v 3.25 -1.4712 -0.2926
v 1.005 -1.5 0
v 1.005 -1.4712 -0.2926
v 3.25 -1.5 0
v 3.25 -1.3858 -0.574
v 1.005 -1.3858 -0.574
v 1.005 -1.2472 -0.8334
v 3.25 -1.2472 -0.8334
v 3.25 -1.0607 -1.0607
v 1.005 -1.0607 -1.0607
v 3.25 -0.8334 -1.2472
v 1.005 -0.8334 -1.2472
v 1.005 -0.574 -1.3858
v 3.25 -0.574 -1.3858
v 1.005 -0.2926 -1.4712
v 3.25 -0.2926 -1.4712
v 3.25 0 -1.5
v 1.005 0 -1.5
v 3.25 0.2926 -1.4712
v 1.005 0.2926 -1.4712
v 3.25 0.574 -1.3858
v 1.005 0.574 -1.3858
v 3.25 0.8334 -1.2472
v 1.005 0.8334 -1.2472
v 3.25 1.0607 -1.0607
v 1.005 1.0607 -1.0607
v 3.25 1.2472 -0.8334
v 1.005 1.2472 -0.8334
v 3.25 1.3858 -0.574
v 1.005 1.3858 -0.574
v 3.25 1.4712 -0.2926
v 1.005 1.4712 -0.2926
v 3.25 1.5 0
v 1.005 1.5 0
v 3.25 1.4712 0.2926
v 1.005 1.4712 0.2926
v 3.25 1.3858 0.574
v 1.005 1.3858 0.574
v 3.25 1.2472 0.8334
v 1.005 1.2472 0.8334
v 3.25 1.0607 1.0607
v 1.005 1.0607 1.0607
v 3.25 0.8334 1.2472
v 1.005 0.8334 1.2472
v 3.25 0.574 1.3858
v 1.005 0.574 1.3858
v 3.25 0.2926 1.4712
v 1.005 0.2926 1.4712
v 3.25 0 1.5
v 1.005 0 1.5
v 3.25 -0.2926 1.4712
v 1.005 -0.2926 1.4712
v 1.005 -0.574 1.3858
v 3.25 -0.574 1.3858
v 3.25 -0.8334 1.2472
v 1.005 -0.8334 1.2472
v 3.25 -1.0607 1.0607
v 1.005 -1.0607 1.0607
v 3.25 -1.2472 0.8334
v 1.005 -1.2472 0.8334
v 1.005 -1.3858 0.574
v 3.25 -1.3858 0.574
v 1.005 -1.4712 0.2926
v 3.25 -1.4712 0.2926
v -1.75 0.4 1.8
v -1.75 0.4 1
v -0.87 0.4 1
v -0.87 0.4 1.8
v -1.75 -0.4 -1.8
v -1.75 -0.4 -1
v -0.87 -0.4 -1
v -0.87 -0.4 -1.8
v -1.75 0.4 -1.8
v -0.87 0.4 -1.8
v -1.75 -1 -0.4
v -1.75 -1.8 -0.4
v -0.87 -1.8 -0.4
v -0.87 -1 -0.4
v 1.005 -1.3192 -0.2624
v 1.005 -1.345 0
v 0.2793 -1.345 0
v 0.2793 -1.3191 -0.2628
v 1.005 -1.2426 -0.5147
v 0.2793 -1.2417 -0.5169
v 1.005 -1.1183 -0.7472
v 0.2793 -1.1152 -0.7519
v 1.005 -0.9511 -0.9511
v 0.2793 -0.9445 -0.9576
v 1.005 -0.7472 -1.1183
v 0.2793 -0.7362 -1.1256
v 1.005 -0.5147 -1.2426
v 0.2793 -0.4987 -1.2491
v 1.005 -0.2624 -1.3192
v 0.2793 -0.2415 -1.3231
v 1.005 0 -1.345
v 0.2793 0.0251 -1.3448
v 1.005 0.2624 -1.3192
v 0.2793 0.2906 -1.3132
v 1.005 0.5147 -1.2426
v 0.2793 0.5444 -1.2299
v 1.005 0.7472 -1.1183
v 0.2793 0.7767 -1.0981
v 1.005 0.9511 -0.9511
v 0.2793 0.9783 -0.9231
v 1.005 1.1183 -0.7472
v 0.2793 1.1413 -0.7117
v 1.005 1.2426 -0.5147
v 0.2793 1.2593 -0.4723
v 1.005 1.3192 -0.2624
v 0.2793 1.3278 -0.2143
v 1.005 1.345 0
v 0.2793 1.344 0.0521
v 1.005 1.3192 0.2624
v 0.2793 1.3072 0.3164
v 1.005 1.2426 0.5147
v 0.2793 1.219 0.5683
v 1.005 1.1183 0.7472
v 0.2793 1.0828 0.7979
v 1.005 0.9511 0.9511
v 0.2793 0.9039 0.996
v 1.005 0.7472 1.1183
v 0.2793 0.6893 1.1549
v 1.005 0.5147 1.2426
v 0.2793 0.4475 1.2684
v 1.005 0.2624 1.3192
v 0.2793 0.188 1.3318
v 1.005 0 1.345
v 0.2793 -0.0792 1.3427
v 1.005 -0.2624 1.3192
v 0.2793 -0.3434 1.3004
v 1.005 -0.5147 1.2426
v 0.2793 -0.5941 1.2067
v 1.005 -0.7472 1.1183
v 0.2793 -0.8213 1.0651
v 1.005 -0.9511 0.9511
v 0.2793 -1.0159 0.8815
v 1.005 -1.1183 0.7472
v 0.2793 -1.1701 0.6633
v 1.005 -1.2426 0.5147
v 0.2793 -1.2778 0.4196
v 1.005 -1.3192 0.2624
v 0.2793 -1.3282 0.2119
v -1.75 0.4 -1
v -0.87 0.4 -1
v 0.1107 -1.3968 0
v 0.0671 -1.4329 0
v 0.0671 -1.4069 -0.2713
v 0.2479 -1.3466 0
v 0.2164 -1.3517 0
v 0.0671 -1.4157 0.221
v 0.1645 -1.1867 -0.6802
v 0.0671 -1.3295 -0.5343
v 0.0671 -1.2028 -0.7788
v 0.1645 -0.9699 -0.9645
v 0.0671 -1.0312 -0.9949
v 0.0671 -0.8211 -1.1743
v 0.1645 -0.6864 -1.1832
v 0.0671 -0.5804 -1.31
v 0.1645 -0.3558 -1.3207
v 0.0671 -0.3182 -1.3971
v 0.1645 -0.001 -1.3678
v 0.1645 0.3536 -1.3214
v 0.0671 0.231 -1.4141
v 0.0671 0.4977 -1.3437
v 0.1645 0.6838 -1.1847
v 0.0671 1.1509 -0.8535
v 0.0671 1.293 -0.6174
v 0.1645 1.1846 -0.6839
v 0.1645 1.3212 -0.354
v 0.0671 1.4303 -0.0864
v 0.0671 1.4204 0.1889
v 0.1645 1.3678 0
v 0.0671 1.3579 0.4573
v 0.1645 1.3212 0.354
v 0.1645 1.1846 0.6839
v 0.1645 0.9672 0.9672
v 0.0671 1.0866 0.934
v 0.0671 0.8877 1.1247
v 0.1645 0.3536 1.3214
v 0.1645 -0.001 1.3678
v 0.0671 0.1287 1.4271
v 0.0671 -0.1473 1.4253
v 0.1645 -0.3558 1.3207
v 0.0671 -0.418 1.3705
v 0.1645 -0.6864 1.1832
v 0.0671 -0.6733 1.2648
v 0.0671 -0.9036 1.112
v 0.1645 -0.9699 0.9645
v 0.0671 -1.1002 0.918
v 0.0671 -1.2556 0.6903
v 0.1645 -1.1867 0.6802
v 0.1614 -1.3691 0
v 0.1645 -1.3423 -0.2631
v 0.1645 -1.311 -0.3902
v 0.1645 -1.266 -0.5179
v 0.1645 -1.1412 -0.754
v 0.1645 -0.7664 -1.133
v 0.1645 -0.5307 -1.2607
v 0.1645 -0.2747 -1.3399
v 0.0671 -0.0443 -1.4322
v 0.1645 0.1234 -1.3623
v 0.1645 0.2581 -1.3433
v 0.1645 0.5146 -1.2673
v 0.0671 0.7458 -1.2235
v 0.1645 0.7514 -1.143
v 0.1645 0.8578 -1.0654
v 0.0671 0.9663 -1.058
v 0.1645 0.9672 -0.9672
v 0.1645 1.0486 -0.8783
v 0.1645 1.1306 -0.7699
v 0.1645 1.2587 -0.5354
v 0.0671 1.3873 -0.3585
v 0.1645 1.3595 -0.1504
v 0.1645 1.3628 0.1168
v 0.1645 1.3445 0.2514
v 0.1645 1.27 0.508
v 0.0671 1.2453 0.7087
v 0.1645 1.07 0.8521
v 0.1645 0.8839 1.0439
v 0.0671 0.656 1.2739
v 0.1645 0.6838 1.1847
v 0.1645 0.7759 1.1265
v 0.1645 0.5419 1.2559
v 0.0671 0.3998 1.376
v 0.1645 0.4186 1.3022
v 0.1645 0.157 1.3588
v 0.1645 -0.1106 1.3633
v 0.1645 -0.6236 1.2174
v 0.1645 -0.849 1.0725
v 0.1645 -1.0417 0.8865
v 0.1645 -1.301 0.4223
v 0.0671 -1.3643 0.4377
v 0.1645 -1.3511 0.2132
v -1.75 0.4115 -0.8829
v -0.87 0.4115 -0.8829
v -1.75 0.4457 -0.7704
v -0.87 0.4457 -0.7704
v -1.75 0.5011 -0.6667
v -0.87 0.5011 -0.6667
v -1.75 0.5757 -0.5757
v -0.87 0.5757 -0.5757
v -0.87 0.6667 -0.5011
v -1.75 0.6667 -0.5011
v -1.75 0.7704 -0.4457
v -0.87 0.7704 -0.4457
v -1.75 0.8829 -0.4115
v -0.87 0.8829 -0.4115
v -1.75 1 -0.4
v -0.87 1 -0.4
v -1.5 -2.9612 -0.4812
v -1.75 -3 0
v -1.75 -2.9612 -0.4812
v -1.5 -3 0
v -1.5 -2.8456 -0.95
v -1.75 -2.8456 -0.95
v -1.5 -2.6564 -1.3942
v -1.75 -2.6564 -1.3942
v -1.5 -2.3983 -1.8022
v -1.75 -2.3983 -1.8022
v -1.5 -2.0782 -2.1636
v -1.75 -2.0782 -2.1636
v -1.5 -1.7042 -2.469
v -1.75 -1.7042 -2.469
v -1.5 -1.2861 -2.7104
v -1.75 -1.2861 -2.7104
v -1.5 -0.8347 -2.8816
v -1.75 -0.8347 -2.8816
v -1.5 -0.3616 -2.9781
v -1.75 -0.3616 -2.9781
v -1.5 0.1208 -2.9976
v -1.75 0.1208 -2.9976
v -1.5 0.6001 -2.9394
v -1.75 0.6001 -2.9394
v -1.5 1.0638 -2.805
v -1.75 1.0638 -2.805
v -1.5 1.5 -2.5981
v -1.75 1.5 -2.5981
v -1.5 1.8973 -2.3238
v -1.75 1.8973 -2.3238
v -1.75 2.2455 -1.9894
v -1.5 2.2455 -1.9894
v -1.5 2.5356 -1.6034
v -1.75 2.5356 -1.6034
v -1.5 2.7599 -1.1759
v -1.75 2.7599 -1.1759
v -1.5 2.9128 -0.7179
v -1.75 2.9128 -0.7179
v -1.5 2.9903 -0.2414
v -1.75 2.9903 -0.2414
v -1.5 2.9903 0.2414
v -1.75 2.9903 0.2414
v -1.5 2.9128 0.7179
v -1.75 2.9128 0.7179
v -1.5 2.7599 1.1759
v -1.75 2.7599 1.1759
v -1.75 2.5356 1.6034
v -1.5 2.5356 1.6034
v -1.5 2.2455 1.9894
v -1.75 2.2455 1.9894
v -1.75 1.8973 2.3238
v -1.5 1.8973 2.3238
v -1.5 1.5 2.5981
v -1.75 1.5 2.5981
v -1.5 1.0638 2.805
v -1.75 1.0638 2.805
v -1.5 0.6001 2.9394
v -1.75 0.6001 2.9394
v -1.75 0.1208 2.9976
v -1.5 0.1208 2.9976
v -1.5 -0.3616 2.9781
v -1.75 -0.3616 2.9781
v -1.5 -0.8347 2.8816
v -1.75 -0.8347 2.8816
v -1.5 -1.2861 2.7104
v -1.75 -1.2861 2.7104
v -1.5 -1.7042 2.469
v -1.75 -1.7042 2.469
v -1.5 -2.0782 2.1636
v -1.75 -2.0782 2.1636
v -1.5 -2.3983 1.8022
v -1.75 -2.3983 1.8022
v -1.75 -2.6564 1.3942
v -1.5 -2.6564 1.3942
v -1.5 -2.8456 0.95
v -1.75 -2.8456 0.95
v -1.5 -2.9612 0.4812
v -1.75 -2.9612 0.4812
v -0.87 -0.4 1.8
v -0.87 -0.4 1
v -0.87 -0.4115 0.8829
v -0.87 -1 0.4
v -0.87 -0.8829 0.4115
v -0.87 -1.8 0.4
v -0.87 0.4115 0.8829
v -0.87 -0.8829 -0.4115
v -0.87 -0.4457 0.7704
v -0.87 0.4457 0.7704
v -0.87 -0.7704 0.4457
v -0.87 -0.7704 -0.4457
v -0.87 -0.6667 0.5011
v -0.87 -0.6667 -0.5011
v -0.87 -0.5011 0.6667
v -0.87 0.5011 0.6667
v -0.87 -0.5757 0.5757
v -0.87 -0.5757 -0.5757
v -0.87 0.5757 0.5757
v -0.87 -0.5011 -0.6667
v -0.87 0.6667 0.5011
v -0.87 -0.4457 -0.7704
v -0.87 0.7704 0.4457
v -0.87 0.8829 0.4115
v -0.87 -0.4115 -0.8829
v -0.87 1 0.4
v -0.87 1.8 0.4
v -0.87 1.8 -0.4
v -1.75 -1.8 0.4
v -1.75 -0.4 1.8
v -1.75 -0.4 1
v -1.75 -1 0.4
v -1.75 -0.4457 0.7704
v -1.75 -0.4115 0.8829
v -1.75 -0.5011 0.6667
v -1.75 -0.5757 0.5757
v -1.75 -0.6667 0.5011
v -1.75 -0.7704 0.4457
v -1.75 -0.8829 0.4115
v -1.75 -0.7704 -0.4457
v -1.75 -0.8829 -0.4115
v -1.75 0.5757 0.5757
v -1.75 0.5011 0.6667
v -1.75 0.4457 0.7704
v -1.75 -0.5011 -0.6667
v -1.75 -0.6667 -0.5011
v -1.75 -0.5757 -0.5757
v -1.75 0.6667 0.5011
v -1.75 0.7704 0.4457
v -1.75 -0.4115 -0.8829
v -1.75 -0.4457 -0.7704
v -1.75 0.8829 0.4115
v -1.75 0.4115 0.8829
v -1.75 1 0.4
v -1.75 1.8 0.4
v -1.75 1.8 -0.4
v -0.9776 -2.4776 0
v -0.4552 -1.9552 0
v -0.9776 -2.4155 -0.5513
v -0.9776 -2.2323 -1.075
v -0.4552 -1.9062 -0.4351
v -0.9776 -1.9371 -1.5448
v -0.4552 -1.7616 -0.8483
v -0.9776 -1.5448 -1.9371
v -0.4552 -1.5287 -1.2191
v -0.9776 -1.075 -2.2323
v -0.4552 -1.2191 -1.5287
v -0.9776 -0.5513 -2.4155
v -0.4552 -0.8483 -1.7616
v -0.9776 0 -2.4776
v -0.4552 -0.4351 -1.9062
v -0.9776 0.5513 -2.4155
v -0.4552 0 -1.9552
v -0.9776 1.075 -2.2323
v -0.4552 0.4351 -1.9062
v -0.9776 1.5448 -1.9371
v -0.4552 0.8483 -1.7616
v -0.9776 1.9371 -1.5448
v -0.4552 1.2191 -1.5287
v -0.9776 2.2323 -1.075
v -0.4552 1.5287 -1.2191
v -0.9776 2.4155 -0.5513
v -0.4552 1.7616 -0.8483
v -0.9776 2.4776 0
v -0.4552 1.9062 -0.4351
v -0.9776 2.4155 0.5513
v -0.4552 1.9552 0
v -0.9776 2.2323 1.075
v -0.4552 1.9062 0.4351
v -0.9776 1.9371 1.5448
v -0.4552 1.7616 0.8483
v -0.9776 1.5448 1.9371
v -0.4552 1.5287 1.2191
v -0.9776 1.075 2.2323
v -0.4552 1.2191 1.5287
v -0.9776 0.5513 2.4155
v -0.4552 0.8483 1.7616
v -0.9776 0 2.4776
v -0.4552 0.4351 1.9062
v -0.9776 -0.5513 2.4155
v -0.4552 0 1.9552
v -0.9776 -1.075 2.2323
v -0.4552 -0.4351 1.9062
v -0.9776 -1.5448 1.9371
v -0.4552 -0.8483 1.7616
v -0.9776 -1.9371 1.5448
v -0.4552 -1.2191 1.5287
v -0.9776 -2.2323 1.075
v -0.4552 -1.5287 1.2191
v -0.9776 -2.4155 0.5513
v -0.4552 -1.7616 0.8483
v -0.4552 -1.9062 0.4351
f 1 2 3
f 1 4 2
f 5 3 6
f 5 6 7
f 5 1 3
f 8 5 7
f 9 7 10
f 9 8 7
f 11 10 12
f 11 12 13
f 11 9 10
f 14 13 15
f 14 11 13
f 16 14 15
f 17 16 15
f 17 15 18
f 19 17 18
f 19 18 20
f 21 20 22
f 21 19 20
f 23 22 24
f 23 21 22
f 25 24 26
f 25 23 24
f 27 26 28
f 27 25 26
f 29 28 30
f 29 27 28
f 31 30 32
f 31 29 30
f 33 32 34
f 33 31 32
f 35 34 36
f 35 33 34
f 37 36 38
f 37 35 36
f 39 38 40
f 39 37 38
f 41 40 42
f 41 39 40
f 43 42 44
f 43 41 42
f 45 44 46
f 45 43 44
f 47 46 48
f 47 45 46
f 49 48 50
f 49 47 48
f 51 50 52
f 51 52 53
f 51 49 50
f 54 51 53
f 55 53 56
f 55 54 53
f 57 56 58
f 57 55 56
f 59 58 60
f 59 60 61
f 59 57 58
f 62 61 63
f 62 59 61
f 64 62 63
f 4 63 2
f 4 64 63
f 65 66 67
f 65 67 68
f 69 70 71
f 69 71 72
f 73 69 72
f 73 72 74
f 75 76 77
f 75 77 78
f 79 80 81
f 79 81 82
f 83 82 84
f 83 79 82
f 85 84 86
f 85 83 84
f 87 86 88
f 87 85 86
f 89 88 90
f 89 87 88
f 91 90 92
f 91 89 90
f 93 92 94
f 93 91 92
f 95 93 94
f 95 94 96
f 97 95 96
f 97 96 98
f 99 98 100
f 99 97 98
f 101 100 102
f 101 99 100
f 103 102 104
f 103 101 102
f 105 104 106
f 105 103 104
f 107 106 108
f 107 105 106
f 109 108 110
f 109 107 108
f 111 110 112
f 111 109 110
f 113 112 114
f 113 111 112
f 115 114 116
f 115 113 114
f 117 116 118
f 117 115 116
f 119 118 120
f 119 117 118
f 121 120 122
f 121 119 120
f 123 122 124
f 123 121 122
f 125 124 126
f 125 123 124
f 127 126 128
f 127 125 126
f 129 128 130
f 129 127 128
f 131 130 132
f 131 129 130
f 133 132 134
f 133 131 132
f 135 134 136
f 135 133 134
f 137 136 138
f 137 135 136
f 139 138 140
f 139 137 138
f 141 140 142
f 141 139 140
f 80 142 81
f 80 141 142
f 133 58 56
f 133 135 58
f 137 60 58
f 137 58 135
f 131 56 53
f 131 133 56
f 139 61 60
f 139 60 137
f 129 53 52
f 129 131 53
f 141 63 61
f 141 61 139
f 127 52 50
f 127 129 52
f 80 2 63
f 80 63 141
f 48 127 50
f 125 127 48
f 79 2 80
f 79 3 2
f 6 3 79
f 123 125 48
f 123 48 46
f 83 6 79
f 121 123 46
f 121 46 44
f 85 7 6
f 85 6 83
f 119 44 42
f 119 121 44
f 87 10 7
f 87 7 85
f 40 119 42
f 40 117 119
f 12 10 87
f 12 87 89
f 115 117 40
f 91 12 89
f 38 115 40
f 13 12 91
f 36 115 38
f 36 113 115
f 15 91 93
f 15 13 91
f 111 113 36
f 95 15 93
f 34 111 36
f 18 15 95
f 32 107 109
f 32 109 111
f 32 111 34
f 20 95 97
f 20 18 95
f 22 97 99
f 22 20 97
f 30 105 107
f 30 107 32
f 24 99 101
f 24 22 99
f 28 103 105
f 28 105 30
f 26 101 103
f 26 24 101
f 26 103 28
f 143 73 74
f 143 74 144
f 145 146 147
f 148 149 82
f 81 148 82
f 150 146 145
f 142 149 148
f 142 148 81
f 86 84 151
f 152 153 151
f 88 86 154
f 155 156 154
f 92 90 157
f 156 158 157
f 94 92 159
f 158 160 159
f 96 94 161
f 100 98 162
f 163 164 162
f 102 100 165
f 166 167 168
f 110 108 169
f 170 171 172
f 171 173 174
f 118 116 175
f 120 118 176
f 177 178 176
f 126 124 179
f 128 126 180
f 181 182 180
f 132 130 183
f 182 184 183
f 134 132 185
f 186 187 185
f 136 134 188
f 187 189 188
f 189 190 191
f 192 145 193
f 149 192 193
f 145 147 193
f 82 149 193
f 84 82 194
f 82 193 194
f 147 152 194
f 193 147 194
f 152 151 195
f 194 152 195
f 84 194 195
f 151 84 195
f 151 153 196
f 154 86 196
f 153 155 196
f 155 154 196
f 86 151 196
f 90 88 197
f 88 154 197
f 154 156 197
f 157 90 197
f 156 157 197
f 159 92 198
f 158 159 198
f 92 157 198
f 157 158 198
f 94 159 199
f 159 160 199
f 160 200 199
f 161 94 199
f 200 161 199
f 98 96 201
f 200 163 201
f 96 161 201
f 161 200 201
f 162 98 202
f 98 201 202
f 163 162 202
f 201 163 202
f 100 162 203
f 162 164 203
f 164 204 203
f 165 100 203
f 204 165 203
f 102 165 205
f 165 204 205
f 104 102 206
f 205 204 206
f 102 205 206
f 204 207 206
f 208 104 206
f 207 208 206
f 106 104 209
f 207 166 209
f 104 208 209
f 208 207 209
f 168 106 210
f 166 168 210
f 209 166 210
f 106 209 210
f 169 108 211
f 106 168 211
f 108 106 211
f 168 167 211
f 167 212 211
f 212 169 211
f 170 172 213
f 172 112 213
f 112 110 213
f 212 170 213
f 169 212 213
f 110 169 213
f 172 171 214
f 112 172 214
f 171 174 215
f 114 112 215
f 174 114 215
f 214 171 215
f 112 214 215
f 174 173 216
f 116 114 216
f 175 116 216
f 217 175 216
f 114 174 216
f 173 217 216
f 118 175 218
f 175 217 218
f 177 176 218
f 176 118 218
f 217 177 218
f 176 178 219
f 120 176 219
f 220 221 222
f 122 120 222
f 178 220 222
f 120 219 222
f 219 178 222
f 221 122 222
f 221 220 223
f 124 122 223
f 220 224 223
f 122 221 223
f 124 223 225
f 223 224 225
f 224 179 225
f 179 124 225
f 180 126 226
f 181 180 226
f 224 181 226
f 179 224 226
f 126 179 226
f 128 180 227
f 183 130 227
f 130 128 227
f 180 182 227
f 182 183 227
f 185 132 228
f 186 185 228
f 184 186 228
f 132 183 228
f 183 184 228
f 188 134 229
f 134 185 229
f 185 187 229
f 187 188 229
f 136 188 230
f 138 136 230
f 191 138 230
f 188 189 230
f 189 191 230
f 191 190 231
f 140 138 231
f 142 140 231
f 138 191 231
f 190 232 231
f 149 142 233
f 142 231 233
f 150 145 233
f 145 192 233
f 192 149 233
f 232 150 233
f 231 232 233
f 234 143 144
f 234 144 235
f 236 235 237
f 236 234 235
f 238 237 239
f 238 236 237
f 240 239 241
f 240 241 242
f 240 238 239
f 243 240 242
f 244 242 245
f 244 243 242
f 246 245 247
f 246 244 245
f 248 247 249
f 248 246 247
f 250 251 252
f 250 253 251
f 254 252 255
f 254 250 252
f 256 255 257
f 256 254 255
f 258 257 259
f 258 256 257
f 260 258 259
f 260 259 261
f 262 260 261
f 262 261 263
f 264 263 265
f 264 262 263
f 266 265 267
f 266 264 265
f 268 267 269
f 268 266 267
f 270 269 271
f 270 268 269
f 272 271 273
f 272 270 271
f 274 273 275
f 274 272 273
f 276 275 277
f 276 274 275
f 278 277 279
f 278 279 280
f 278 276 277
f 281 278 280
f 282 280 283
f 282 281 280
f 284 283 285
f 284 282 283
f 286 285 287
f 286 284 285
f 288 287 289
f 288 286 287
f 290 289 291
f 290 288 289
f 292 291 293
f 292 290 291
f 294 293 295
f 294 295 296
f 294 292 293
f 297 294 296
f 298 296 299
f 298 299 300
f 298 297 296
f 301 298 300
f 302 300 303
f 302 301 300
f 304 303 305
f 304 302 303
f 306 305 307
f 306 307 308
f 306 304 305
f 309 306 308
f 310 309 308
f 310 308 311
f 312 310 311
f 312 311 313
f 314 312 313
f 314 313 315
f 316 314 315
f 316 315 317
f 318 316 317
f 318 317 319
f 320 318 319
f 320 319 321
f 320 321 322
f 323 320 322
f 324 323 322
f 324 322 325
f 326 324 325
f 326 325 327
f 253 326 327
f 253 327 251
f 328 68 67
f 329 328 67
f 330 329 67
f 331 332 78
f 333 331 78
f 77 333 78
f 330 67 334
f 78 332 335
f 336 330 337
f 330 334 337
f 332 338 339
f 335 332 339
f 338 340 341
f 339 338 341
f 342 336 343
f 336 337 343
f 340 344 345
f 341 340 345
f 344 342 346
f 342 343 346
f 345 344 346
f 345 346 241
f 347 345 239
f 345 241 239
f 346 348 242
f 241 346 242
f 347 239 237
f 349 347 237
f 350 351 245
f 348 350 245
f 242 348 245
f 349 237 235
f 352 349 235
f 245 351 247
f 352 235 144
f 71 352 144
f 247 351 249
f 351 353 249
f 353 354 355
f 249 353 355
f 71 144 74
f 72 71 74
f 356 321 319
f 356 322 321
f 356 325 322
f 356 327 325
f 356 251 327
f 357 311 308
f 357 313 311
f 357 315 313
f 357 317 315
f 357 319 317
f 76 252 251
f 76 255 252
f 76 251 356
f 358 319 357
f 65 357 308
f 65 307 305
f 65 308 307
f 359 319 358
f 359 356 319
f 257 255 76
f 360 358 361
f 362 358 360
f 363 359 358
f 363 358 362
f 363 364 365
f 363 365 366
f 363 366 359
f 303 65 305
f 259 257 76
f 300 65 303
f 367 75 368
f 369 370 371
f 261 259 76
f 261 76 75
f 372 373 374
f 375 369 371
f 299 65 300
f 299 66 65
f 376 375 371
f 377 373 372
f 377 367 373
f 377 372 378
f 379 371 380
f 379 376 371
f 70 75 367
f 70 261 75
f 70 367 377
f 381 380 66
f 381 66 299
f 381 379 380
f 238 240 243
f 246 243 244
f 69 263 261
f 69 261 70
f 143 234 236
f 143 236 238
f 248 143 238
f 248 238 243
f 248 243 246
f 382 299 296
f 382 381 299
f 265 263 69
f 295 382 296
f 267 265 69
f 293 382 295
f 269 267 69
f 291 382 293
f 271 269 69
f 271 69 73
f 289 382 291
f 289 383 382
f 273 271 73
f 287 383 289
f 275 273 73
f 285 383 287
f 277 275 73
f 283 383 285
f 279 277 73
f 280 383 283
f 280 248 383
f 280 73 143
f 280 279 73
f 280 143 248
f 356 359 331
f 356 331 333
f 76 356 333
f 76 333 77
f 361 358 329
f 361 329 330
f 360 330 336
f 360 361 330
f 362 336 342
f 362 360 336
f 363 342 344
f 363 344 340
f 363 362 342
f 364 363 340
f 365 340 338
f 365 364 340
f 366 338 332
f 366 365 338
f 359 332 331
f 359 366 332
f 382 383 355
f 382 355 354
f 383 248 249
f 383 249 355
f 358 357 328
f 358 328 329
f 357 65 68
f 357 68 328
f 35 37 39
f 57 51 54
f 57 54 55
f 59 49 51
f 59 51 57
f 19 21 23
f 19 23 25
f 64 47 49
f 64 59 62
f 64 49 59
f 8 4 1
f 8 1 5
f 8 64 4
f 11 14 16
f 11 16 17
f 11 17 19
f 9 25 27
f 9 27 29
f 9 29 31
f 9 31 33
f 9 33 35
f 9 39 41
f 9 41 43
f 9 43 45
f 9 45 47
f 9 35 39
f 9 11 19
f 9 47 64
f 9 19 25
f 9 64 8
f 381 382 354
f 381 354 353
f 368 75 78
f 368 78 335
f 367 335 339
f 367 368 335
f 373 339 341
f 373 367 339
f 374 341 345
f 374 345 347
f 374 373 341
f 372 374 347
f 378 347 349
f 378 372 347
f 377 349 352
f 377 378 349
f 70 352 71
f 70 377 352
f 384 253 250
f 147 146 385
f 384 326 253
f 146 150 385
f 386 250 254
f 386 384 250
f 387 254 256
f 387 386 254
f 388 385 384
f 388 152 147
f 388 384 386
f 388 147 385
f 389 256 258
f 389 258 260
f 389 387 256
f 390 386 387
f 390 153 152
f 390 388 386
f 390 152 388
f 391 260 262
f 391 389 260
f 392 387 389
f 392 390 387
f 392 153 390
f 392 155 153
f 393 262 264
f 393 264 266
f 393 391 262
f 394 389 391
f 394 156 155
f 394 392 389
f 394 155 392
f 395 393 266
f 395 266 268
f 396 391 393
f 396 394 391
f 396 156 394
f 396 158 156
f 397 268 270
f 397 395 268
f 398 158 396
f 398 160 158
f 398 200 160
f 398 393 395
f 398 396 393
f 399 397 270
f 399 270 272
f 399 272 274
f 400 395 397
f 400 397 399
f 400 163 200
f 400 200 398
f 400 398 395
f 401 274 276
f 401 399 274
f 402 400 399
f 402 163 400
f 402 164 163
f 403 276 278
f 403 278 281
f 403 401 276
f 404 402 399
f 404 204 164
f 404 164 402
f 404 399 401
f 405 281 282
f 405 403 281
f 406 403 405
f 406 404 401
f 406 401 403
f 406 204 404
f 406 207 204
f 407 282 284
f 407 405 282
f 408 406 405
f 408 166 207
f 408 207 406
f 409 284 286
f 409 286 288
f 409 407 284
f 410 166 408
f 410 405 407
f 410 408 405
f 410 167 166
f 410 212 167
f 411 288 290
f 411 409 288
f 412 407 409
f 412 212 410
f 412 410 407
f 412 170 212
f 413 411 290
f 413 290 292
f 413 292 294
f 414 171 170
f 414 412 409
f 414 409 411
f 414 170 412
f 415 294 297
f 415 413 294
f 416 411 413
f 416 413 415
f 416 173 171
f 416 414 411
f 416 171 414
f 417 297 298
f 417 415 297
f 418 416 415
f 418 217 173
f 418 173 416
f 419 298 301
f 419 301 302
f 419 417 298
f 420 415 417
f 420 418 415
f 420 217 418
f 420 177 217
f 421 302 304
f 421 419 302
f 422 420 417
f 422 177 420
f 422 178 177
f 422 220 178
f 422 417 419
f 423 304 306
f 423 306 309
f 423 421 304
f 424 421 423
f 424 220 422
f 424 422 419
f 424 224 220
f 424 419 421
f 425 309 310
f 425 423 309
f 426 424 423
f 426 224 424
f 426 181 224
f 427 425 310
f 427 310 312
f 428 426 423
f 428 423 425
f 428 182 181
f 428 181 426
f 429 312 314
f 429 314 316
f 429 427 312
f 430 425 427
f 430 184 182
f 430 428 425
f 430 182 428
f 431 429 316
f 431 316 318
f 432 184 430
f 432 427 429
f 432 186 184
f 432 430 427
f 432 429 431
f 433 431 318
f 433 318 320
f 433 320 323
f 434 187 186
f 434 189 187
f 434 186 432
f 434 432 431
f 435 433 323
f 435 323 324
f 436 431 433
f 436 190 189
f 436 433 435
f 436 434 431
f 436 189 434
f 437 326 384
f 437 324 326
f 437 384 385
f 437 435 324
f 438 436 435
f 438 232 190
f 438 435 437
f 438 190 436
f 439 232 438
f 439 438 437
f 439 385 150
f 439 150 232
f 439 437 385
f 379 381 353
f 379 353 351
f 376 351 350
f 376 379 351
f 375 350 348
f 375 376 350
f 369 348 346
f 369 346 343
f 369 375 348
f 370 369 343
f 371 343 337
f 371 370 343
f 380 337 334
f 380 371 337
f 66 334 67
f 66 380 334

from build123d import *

# Parameters (mm, degrees)
FILLET1_R          = 0.3
CUT_EXTRUDE1_DEPTH = 0.88


with BuildPart() as part:
    # Sketch1 → Revolve1 (revolve)
    with BuildSketch(Plane.XY, mode=Mode.PRIVATE) as revolve1_sk:
        Polygon((-1.75, 0), (-1.75, 3), (-1.5, 3), (0.155, 1.345), (1.005, 1.345), (1.005, 1.5), (3.25, 1.5), (3.25, 0), align=None)
    revolve(revolve1_sk.sketch.rotate(Axis((-1.75, 0, 0), (1, 0, 0)), 180), axis=Axis((-1.75, 0, 0), (1, 0, 0)))

    # Fillet1
    fillet1_edges = [part.edges().sort_by_distance(p)[0] for p in [
        (0.155, 1.345, 0),
    ]]
    fillet(fillet1_edges, radius=FILLET1_R)

    # Sketch2 → Cut-Extrude1 (cut)
    with BuildSketch(Plane.ZY.offset(1.75)):
        with BuildLine():
            Line((-0.4, 1.8), (0.4, 1.8))
            Line((0.4, 1.8), (0.4, 1))
            ThreePointArc((0.4, 1), (0.575735931, 0.575735931), (1, 0.4))
            Line((1, 0.4), (1.8, 0.4))
            Line((1.8, 0.4), (1.8, -0.4))
            Line((1.8, -0.4), (1, -0.4))
            ThreePointArc((1, -0.4), (0.575735931, -0.575735931), (0.4, -1))
            Line((0.4, -1), (0.4, -1.8))
            Line((0.4, -1.8), (-0.4, -1.8))
            Line((-0.4, -1.8), (-0.4, -1))
            ThreePointArc((-0.4, -1), (-0.575735931, -0.575735931), (-1, -0.4))
            Line((-1, -0.4), (-1.8, -0.4))
            Line((-1.8, -0.4), (-1.8, 0.4))
            Line((-1.8, 0.4), (-1, 0.4))
            ThreePointArc((-1, 0.4), (-0.575735931, 0.575735931), (-0.4, 1))
            Line((-0.4, 1), (-0.4, 1.8))
        make_face()
    extrude(amount=-CUT_EXTRUDE1_DEPTH, mode=Mode.SUBTRACT)


solid = part.part
